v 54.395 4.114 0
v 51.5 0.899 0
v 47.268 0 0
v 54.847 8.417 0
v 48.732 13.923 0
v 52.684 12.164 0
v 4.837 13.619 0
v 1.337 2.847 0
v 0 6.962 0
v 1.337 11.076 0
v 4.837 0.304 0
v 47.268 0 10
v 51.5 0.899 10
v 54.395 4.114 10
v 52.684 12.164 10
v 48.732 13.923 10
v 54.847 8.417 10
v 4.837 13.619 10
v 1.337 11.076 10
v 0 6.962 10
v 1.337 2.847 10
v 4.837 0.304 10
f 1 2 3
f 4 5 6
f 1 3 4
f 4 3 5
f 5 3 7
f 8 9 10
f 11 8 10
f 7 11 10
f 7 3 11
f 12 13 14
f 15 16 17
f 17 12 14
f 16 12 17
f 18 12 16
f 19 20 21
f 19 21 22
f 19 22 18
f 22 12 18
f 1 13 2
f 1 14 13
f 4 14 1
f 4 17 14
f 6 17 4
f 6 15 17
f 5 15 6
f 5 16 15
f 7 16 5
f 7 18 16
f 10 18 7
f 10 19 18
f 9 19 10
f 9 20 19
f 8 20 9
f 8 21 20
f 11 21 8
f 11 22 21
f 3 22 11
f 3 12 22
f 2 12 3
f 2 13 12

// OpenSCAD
$fn = 32;

// ----------------------------------------------------------------------
// Key bar: parallel key, 10 mm thick
// ----------------------------------------------------------------------

// --- parameters (mm) ---
profile_height = 10;      // extrusion height
profile_points = 11;      // points of the closed outline

profile = [[0, 6.962], [1.337, 2.847], [4.837, 0.304], [47.268, 0], [51.5, 0.899], [54.395, 4.114], [54.847, 8.417], [52.684, 12.164], [48.732, 13.923], [4.837, 13.619], [1.337, 11.076]];  // single closed polygon, 11 points, counter clockwise

// --- the one profile operation ---
linear_extrude(height = profile_height) polygon(points = profile);
